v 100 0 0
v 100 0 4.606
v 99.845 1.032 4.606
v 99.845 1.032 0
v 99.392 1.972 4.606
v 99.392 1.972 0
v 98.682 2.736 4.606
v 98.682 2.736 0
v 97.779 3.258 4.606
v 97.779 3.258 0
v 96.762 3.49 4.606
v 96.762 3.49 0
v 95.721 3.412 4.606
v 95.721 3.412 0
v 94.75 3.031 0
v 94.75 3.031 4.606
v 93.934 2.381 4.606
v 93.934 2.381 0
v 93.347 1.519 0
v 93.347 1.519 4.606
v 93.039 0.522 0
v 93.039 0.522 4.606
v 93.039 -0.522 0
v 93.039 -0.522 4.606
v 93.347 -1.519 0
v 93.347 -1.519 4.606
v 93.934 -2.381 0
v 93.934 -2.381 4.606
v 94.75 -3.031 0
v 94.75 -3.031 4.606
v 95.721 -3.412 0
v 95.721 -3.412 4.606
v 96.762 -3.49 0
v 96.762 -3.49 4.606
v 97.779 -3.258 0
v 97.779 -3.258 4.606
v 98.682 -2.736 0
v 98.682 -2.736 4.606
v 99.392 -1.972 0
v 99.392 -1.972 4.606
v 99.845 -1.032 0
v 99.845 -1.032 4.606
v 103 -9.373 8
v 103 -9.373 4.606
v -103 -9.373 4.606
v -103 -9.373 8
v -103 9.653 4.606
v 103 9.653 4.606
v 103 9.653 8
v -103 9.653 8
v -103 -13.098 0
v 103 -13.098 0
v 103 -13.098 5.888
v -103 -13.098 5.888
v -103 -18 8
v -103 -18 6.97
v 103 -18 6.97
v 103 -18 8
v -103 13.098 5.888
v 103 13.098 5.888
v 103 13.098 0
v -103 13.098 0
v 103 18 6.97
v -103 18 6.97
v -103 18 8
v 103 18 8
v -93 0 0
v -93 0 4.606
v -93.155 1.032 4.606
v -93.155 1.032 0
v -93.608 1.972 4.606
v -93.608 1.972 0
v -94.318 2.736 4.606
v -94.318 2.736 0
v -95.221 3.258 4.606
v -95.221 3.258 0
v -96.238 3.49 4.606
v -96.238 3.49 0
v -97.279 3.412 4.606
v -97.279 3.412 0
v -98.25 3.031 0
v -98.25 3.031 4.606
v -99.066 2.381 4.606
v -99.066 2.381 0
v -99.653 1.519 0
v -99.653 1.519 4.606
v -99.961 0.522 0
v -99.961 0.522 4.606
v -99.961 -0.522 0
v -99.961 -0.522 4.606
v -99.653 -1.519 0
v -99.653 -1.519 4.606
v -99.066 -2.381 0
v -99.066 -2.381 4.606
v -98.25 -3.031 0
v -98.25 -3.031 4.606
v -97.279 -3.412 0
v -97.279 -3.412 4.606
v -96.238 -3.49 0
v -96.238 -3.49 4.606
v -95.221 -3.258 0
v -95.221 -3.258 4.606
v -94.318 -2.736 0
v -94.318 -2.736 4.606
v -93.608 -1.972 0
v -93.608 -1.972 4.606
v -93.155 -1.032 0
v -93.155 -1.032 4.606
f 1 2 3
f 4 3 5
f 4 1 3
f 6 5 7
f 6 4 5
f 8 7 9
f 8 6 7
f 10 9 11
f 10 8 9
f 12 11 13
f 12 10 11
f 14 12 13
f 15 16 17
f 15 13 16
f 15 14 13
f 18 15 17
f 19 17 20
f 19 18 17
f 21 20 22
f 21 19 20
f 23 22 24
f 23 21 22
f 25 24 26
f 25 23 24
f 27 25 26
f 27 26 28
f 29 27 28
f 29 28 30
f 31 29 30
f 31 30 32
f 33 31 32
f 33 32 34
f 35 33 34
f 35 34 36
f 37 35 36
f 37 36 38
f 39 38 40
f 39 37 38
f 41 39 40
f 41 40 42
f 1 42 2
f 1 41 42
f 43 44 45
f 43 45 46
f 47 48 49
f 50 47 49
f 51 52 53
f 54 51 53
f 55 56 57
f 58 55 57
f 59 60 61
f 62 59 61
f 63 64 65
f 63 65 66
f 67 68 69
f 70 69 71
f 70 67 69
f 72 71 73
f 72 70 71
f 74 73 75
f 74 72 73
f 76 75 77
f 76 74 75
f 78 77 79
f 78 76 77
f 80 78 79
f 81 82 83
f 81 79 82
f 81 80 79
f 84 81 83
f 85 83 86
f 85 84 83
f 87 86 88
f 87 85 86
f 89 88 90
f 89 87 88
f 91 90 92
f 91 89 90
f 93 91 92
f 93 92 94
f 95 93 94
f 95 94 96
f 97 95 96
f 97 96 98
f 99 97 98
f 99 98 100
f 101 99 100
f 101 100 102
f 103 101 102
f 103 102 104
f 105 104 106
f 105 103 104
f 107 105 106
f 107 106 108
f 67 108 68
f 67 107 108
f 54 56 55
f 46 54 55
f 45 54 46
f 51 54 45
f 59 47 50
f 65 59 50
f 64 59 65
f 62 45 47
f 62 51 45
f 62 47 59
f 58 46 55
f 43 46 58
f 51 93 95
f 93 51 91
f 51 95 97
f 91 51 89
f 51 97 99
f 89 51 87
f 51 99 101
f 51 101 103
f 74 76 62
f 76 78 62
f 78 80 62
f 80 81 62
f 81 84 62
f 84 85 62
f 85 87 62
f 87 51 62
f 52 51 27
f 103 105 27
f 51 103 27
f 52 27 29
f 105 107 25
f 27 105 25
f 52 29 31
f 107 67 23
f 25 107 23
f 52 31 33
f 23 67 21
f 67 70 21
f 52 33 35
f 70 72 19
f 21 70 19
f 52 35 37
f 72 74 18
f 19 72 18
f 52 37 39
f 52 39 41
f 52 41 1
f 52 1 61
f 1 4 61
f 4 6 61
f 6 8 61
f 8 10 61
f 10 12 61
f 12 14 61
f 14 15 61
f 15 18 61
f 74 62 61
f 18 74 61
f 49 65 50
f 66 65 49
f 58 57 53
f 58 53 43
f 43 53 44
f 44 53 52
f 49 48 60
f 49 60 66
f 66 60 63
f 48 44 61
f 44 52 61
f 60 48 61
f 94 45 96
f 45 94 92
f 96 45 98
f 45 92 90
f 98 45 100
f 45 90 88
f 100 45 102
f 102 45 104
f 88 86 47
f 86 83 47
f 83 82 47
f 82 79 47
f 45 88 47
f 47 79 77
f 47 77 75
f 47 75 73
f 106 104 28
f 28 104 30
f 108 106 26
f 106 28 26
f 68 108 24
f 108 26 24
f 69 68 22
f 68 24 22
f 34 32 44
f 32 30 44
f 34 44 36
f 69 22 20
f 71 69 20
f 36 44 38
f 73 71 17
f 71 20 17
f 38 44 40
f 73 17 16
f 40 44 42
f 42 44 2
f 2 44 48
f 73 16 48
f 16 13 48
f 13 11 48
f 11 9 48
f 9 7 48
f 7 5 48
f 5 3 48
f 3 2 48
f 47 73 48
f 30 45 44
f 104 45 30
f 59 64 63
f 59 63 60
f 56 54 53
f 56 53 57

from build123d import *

# Parameters (mm, degrees)
F0_W     = 206
F0_H     = 36
F0_R     = 3.5
F1_DEPTH = 8
F2_W     = 19.0265765414
F2_H     = 3.3935653903
F3_DEPTH = 206.001
F5_DEPTH = 206.001


with BuildPart() as f1:
    # F0 (on Top) → F1 (new body)
    with BuildSketch(Plane.XY):
        Rectangle(F0_W, F0_H)
        with Locations((-96.5, 0)):
            Circle(F0_R, mode=Mode.SUBTRACT)
        with Locations((96.5, 0)):
            Circle(F0_R, mode=Mode.SUBTRACT)
    extrude(amount=F1_DEPTH)

    # F2 (on face) → F3 (cut, through all)
    with BuildSketch(Plane.YZ.offset(103)):
        with Locations((0.1401952468, 6.3032173049)):
            Rectangle(F2_W, F2_H)
    extrude(amount=-F3_DEPTH, mode=Mode.SUBTRACT)

    # F4 (on face) → F5 (cut, through all)
    with BuildSketch(Plane.YZ.offset(103)):
        Polygon((13.0982967094, 5.8882250451), (13.0982967094, 0), (18, 0), (18, 6.9697359577), align=None)
        Polygon((-13.0982967094, 5.8882250451), (-18, 6.9697359577), (-18, 0), (-13.0982967094, 0), align=None)
    extrude(amount=-F5_DEPTH, mode=Mode.SUBTRACT)


solid = f1.part
